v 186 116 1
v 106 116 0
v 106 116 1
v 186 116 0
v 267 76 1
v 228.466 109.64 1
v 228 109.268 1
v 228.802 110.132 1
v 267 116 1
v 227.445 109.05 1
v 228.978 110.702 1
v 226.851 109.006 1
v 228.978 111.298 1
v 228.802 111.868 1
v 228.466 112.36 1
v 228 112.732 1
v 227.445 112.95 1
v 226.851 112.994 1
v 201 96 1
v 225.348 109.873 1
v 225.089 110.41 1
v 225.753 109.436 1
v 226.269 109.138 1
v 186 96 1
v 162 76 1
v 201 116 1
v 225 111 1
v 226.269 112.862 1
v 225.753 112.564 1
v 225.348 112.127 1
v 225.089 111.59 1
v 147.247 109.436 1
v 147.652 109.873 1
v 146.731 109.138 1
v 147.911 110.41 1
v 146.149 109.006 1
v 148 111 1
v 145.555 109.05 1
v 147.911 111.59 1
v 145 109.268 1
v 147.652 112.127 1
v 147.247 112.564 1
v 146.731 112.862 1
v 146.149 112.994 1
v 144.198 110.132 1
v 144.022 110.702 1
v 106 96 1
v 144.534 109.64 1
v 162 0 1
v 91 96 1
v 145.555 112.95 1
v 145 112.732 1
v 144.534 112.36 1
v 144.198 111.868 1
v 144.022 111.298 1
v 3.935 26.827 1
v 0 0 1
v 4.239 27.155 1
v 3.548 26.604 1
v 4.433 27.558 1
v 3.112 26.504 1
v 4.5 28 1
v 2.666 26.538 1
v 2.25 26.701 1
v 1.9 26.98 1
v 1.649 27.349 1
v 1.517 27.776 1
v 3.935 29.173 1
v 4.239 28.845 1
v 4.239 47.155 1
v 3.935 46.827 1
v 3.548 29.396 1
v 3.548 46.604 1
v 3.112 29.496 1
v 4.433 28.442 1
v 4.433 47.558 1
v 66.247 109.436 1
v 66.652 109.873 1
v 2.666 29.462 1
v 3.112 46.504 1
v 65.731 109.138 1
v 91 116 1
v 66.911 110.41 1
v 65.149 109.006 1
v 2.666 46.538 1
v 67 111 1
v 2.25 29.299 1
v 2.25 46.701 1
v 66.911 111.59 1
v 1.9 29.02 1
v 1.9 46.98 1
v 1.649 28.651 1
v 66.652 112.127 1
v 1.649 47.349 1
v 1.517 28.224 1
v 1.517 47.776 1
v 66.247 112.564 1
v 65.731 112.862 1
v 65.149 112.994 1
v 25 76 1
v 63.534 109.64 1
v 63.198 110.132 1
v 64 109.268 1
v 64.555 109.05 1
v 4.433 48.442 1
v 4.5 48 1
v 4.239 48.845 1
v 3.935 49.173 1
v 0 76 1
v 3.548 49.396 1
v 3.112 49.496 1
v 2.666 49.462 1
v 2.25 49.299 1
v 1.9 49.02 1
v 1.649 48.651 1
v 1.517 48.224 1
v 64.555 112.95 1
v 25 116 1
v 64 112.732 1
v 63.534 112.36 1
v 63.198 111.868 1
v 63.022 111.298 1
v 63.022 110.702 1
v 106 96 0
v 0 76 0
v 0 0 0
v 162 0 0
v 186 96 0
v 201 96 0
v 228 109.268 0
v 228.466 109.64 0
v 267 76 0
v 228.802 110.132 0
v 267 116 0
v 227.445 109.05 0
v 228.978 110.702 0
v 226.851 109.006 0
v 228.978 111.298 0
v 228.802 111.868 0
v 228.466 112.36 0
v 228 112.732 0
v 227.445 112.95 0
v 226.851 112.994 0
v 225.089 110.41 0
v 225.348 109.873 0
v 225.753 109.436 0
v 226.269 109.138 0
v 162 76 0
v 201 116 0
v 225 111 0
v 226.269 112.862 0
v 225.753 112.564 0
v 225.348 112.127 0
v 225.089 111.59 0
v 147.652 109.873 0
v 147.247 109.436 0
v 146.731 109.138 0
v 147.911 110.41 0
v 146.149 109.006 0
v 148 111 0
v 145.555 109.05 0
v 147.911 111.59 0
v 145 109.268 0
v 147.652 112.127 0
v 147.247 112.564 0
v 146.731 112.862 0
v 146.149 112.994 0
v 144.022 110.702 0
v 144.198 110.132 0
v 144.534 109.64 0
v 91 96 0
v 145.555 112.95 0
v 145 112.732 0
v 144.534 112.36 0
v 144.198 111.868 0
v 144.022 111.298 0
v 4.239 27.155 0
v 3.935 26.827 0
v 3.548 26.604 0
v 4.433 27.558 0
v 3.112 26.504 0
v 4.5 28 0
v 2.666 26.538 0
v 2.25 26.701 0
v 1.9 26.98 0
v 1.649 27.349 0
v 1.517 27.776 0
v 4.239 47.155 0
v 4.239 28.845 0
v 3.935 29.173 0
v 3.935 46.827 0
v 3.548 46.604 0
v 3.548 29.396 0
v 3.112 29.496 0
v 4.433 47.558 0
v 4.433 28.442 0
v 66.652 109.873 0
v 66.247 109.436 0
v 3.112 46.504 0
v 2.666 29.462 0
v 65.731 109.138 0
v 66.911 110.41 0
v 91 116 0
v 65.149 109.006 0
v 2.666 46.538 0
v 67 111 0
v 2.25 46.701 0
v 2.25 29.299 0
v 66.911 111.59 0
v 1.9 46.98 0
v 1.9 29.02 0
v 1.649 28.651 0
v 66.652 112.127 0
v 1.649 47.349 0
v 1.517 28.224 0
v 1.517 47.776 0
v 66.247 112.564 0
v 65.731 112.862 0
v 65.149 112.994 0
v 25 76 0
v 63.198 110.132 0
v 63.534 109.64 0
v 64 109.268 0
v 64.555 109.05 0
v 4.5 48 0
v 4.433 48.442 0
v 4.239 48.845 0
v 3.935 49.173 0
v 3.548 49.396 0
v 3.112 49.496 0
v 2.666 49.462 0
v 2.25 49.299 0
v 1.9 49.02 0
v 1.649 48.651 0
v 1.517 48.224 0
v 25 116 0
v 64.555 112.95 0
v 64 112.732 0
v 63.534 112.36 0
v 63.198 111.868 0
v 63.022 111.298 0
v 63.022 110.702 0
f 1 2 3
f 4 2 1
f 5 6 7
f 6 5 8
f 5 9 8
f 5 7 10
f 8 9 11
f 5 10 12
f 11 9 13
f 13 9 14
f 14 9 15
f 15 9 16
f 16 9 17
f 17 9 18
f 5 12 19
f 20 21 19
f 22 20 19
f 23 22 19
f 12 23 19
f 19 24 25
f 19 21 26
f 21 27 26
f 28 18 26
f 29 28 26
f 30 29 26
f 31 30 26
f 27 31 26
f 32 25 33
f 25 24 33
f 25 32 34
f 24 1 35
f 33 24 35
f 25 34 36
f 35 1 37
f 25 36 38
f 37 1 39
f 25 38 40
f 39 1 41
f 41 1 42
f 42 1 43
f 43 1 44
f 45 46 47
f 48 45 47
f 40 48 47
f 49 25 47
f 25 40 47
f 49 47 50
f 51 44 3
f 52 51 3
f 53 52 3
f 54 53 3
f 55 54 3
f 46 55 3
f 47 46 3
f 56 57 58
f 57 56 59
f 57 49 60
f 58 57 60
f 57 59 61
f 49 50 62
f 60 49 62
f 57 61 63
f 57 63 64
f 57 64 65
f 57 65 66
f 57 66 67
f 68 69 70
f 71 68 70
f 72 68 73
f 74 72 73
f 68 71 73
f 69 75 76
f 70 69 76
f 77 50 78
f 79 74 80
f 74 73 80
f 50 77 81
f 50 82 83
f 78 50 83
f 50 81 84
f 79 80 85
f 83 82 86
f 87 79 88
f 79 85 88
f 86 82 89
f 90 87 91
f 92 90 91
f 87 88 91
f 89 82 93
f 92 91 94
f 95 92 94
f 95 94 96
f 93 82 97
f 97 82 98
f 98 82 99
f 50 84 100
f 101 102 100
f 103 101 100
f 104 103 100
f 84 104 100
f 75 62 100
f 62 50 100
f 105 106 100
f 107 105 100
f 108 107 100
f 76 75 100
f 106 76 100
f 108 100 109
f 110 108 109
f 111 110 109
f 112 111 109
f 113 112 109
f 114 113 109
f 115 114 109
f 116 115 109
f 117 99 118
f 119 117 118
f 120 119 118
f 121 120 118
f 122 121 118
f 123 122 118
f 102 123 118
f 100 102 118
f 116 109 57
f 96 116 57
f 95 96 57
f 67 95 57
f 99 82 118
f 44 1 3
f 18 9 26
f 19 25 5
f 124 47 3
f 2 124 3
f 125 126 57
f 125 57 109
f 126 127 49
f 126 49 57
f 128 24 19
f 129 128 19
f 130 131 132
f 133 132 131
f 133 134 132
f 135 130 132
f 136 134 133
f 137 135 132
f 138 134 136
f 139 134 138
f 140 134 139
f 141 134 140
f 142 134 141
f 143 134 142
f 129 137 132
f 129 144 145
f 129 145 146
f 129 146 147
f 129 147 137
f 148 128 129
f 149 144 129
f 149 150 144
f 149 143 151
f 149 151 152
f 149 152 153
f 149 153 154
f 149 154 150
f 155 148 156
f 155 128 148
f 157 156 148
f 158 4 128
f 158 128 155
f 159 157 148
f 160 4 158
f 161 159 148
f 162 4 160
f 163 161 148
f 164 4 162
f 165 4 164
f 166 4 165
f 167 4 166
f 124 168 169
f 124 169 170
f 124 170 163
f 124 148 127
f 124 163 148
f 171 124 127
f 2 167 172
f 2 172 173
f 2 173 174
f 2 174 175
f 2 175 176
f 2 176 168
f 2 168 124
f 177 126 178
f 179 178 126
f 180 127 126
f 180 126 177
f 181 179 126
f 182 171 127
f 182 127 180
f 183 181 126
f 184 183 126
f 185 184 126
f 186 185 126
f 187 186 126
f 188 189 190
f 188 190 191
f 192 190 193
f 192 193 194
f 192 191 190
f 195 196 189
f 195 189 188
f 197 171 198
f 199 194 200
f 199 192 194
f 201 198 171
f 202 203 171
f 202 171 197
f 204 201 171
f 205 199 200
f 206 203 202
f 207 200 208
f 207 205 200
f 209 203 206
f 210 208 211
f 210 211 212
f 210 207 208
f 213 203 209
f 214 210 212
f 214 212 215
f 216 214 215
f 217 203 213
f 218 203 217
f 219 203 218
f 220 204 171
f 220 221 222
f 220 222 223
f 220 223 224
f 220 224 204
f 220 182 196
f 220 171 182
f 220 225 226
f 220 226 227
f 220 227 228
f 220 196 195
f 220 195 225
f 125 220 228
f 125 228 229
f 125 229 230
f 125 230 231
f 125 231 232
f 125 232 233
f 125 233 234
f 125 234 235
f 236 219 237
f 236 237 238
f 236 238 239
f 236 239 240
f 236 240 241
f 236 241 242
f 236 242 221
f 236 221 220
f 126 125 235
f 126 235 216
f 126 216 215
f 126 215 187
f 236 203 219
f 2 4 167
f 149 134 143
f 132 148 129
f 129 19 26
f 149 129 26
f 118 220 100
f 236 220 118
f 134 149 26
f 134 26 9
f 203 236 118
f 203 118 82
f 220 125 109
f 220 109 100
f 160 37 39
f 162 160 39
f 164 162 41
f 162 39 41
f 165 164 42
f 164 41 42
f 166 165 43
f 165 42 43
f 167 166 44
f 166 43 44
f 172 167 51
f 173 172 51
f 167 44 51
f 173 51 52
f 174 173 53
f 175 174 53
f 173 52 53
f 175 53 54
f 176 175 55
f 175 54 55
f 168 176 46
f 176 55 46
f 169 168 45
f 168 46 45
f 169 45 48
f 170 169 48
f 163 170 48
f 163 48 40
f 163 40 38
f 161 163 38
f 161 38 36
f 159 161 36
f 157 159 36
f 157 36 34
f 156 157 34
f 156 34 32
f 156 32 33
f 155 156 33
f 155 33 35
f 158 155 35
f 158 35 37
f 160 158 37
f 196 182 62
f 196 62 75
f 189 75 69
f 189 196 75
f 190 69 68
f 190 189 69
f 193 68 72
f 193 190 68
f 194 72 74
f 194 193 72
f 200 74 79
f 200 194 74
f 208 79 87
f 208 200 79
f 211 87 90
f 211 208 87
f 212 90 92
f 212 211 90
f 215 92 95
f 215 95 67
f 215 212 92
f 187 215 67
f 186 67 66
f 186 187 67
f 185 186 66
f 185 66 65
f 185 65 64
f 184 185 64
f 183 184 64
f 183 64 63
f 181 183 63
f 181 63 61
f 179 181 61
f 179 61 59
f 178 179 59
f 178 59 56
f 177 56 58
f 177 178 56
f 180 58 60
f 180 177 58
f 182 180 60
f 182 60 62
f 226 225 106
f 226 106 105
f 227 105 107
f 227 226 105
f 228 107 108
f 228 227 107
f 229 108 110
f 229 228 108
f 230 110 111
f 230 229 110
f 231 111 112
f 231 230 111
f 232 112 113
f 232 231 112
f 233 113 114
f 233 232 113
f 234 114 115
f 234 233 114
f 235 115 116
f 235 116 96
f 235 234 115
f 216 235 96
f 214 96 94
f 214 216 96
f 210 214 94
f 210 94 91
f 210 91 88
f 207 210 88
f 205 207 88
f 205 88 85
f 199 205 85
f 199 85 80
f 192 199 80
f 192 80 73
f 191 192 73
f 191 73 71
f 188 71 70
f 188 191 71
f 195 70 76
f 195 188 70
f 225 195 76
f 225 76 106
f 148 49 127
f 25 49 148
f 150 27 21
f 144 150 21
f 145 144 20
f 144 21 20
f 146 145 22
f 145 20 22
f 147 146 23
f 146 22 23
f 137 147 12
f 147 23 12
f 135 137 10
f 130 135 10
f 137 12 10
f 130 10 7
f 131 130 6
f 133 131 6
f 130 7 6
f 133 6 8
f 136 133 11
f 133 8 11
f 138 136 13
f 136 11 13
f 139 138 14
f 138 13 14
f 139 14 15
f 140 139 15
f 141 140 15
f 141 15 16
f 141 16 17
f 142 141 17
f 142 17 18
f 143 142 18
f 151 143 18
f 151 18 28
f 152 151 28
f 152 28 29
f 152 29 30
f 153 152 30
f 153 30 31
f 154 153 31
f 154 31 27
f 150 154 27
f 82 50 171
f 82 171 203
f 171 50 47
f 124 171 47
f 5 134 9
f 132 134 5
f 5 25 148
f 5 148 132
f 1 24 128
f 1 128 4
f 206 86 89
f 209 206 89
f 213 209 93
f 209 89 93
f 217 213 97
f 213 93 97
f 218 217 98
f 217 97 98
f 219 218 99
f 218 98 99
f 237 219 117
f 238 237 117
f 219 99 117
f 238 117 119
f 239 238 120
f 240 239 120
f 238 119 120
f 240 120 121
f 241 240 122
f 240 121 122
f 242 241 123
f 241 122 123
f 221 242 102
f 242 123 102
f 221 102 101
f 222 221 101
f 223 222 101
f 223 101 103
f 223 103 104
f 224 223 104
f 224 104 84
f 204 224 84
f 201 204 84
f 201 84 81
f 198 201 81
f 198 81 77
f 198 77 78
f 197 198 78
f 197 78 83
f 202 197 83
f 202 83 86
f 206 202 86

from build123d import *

# Parameters (mm, degrees)
SKETCH_1_R          = 1.5
EXTRUDE_1_DEPTH     = 1
SKETCH_2_R          = 2
SKETCH_2_W          = 15
SKETCH_2_H          = 20
CUT_EXTRUDE_1_DEPTH = 315.198981539
SKETCH_3_W          = 130
SKETCH_3_H          = 76
CUT_EXTRUDE_2_DEPTH = 315.198981539


with BuildPart() as part:
    # 草图1 → 凸台-拉伸1 (new body)
    with BuildSketch(Plane.XY):
        Polygon((0, 0), (0, 76), (25, 76), (25, 116), (267, 116), (267, 76), (292, 76), (292, 0), align=None)
        with Locations((3, 48)):
            Circle(SKETCH_1_R, mode=Mode.SUBTRACT)
        with Locations((3, 28)):
            Circle(SKETCH_1_R, mode=Mode.SUBTRACT)
        with Locations(Location((289, 28, 0), (0, 0, 180))):
            Circle(SKETCH_1_R, mode=Mode.SUBTRACT)
        with Locations(Location((289, 48, 0), (0, 0, 180))):
            Circle(SKETCH_1_R, mode=Mode.SUBTRACT)
    extrude(amount=EXTRUDE_1_DEPTH)

    # 草图2 → 切除-拉伸1 (cut, through all)
    with BuildSketch(Plane.XY.offset(1)):
        with Locations((65, 111)):
            Circle(SKETCH_2_R)
        with Locations(Location((227, 111, 0), (0, 0, 180))):
            Circle(SKETCH_2_R)
        with Locations((146, 111)):
            Circle(SKETCH_2_R)
        with Locations((193.5, 106)):
            Rectangle(SKETCH_2_W, SKETCH_2_H)
        with Locations((98.5, 106)):
            Rectangle(SKETCH_2_W, SKETCH_2_H)
    extrude(amount=-CUT_EXTRUDE_1_DEPTH, mode=Mode.SUBTRACT)

    # 草图3 → 切除-拉伸2 (cut, through all)
    with BuildSketch(Plane.XY.offset(1)):
        with Locations((227, 38)):
            Rectangle(SKETCH_3_W, SKETCH_3_H)
    extrude(amount=-CUT_EXTRUDE_2_DEPTH, mode=Mode.SUBTRACT)


solid = part.part
